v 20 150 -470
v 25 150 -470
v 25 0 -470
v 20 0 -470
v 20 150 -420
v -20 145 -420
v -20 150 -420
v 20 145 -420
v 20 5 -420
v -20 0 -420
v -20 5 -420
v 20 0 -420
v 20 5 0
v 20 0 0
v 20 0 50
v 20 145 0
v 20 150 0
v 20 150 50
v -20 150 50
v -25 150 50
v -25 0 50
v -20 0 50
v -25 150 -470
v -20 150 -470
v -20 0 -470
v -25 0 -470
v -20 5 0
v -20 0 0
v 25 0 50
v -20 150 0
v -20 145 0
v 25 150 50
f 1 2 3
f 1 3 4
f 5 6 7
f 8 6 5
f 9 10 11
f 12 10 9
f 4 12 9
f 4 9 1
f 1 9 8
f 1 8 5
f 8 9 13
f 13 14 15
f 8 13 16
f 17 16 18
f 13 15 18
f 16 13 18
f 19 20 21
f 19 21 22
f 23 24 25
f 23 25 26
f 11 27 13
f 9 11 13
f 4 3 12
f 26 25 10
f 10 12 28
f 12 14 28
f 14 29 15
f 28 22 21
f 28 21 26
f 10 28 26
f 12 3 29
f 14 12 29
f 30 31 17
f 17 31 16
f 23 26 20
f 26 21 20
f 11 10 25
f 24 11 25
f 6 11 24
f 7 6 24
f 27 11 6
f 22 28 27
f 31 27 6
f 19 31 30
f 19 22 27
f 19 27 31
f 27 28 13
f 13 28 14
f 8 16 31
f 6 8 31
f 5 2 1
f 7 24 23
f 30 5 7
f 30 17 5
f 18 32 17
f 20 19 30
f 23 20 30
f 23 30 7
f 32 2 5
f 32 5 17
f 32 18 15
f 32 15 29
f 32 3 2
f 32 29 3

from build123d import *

# Parameters (mm, degrees)
SKETCH1_W           = 50
SKETCH1_H           = 420
BOSS_EXTRUDE1_DEPTH = 150
CUT_EXTRUDE1_DEPTH  = 447.68221366
SKETCH4_W           = 5
SKETCH4_H           = 150
BOSS_EXTRUDE2_DEPTH = 50
SKETCH5_W           = 5
SKETCH5_H           = 150
BOSS_EXTRUDE3_DEPTH = 50
SKETCH7_W           = 5
SKETCH7_H           = 150
BOSS_EXTRUDE4_DEPTH = 50
SKETCH8_W           = 5
SKETCH8_H           = 150
BOSS_EXTRUDE5_DEPTH = 50


with BuildPart() as part:
    # Sketch1 → Boss-Extrude1 (new body)
    with BuildSketch(Plane(origin=(0, 0, 0), x_dir=(1, 0, 0), z_dir=(0, 1, 0))):
        with Locations((0, 210)):
            Rectangle(SKETCH1_W, SKETCH1_H)
    extrude(amount=BOSS_EXTRUDE1_DEPTH)

    # Sketch3 → Cut-Extrude1 (cut, through all)
    with BuildSketch(Plane.XY):
        Polygon((-20, 75), (-20, 5), (20, 5), (20, 145), (-20, 145), align=None)
    extrude(amount=-CUT_EXTRUDE1_DEPTH, mode=Mode.SUBTRACT)

    # Sketch4 → Boss-Extrude2 (add)
    with BuildSketch(Plane.XY):
        with Locations((22.5, 75)):
            Rectangle(SKETCH4_W, SKETCH4_H)
    extrude(amount=BOSS_EXTRUDE2_DEPTH)

    # Sketch5 → Boss-Extrude3 (add)
    with BuildSketch(Plane.XY):
        with Locations((-22.5, 75)):
            Rectangle(SKETCH5_W, SKETCH5_H)
    extrude(amount=BOSS_EXTRUDE3_DEPTH)

    # Sketch7 → Boss-Extrude4 (add)
    with BuildSketch(Plane(origin=(0, 0, -420), x_dir=(-1, 0, 0), z_dir=(0, 0, -1))):
        with Locations((-22.5, 75)):
            Rectangle(SKETCH7_W, SKETCH7_H)
    extrude(amount=BOSS_EXTRUDE4_DEPTH)

    # Sketch8 → Boss-Extrude5 (add)
    with BuildSketch(Plane(origin=(0, 0, -420), x_dir=(-1, 0, 0), z_dir=(0, 0, -1))):
        with Locations((22.5, 75)):
            Rectangle(SKETCH8_W, SKETCH8_H)
    extrude(amount=BOSS_EXTRUDE5_DEPTH)


solid = part.part
